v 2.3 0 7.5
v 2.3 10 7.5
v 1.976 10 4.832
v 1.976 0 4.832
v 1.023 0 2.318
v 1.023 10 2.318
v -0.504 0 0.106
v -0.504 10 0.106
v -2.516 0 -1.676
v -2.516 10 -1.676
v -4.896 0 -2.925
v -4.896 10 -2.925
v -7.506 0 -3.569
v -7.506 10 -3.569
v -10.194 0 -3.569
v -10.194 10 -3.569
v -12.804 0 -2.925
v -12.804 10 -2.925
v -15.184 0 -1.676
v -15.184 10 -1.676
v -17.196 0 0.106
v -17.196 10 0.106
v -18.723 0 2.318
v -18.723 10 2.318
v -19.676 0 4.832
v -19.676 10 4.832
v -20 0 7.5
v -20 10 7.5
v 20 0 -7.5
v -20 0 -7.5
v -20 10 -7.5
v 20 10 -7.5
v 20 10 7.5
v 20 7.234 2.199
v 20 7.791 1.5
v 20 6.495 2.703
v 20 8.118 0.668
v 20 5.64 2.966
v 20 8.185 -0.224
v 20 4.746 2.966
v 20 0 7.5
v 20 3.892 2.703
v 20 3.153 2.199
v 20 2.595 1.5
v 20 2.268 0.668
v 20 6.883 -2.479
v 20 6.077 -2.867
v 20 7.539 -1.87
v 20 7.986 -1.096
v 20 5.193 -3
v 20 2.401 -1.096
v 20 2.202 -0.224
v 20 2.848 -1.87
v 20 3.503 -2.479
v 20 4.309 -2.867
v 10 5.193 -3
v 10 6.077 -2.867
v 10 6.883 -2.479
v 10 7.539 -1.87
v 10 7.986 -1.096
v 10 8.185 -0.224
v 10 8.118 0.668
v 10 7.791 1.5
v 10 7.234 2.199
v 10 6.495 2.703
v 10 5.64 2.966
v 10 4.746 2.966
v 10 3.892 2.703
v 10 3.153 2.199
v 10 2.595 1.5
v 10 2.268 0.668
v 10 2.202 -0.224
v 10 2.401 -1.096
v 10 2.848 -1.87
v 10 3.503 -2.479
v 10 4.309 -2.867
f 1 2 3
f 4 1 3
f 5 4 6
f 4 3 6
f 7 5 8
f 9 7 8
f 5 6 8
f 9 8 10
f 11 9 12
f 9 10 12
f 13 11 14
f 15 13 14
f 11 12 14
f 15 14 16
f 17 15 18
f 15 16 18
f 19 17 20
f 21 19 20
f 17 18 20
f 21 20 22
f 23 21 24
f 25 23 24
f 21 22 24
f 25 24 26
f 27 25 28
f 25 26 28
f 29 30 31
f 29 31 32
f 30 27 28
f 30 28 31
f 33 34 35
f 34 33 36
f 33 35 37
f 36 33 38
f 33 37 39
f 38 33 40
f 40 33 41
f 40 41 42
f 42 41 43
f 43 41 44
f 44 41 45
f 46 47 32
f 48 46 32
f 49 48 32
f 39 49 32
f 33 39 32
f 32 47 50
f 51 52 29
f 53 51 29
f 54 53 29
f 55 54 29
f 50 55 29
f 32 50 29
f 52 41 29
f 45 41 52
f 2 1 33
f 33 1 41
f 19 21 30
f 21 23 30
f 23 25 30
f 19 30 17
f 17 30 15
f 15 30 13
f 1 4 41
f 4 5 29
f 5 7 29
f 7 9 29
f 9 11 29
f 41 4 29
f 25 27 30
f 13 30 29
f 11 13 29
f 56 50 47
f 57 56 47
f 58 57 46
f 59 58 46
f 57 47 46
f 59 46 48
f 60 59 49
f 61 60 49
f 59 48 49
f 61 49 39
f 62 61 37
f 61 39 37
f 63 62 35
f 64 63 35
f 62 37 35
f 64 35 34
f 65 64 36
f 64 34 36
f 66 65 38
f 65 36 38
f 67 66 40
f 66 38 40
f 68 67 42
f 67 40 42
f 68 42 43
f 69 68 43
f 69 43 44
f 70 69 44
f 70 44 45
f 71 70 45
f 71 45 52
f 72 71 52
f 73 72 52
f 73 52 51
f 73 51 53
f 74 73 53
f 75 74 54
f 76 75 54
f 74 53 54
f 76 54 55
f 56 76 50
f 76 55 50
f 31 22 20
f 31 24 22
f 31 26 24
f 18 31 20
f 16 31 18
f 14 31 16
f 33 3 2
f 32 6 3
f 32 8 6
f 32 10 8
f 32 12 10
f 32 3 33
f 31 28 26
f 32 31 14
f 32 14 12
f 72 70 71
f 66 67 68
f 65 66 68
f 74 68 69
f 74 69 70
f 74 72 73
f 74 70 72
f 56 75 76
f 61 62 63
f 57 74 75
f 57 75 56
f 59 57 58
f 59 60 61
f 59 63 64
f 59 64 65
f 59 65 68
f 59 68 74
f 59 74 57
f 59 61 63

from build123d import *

# Parameters (mm, degrees)
IZIM1_W                     = 40
IZIM1_H                     = 15
Y_KSEKLIK_EKSTR_ZYON1_DEPTH = 10
IZIM2_R                     = 3
KES_EKSTR_ZYON1_DEPTH       = 10
IZIM4_R                     = 11.15
KES_EKSTR_ZYON2_DEPTH       = 10


with BuildPart() as part:
    # Çizim1 → Yükseklik-Ekstrüzyon1 (new body)
    with BuildSketch(Plane(origin=(0, 0, 0), x_dir=(1, 0, 0), z_dir=(0, 1, 0))):
        Rectangle(IZIM1_W, IZIM1_H)
    extrude(amount=Y_KSEKLIK_EKSTR_ZYON1_DEPTH)

    # Çizim2 → Kes-Ekstrüzyon1 (cut)
    with BuildSketch(Plane(origin=(20, 0, 0), x_dir=(0, 0, -1), z_dir=(1, 0, 0))):
        with Locations((0, 5.193163971)):
            Circle(IZIM2_R)
    extrude(amount=-KES_EKSTR_ZYON1_DEPTH, mode=Mode.SUBTRACT)

    # Çizim4 → Kes-Ekstrüzyon2 (cut)
    with BuildSketch(Plane(origin=(0, 10, 0), x_dir=(1, 0, 0), z_dir=(0, 1, 0))):
        with Locations((-8.85, -7.5)):
            Circle(IZIM4_R)
    extrude(amount=-KES_EKSTR_ZYON2_DEPTH, mode=Mode.SUBTRACT)


solid = part.part
